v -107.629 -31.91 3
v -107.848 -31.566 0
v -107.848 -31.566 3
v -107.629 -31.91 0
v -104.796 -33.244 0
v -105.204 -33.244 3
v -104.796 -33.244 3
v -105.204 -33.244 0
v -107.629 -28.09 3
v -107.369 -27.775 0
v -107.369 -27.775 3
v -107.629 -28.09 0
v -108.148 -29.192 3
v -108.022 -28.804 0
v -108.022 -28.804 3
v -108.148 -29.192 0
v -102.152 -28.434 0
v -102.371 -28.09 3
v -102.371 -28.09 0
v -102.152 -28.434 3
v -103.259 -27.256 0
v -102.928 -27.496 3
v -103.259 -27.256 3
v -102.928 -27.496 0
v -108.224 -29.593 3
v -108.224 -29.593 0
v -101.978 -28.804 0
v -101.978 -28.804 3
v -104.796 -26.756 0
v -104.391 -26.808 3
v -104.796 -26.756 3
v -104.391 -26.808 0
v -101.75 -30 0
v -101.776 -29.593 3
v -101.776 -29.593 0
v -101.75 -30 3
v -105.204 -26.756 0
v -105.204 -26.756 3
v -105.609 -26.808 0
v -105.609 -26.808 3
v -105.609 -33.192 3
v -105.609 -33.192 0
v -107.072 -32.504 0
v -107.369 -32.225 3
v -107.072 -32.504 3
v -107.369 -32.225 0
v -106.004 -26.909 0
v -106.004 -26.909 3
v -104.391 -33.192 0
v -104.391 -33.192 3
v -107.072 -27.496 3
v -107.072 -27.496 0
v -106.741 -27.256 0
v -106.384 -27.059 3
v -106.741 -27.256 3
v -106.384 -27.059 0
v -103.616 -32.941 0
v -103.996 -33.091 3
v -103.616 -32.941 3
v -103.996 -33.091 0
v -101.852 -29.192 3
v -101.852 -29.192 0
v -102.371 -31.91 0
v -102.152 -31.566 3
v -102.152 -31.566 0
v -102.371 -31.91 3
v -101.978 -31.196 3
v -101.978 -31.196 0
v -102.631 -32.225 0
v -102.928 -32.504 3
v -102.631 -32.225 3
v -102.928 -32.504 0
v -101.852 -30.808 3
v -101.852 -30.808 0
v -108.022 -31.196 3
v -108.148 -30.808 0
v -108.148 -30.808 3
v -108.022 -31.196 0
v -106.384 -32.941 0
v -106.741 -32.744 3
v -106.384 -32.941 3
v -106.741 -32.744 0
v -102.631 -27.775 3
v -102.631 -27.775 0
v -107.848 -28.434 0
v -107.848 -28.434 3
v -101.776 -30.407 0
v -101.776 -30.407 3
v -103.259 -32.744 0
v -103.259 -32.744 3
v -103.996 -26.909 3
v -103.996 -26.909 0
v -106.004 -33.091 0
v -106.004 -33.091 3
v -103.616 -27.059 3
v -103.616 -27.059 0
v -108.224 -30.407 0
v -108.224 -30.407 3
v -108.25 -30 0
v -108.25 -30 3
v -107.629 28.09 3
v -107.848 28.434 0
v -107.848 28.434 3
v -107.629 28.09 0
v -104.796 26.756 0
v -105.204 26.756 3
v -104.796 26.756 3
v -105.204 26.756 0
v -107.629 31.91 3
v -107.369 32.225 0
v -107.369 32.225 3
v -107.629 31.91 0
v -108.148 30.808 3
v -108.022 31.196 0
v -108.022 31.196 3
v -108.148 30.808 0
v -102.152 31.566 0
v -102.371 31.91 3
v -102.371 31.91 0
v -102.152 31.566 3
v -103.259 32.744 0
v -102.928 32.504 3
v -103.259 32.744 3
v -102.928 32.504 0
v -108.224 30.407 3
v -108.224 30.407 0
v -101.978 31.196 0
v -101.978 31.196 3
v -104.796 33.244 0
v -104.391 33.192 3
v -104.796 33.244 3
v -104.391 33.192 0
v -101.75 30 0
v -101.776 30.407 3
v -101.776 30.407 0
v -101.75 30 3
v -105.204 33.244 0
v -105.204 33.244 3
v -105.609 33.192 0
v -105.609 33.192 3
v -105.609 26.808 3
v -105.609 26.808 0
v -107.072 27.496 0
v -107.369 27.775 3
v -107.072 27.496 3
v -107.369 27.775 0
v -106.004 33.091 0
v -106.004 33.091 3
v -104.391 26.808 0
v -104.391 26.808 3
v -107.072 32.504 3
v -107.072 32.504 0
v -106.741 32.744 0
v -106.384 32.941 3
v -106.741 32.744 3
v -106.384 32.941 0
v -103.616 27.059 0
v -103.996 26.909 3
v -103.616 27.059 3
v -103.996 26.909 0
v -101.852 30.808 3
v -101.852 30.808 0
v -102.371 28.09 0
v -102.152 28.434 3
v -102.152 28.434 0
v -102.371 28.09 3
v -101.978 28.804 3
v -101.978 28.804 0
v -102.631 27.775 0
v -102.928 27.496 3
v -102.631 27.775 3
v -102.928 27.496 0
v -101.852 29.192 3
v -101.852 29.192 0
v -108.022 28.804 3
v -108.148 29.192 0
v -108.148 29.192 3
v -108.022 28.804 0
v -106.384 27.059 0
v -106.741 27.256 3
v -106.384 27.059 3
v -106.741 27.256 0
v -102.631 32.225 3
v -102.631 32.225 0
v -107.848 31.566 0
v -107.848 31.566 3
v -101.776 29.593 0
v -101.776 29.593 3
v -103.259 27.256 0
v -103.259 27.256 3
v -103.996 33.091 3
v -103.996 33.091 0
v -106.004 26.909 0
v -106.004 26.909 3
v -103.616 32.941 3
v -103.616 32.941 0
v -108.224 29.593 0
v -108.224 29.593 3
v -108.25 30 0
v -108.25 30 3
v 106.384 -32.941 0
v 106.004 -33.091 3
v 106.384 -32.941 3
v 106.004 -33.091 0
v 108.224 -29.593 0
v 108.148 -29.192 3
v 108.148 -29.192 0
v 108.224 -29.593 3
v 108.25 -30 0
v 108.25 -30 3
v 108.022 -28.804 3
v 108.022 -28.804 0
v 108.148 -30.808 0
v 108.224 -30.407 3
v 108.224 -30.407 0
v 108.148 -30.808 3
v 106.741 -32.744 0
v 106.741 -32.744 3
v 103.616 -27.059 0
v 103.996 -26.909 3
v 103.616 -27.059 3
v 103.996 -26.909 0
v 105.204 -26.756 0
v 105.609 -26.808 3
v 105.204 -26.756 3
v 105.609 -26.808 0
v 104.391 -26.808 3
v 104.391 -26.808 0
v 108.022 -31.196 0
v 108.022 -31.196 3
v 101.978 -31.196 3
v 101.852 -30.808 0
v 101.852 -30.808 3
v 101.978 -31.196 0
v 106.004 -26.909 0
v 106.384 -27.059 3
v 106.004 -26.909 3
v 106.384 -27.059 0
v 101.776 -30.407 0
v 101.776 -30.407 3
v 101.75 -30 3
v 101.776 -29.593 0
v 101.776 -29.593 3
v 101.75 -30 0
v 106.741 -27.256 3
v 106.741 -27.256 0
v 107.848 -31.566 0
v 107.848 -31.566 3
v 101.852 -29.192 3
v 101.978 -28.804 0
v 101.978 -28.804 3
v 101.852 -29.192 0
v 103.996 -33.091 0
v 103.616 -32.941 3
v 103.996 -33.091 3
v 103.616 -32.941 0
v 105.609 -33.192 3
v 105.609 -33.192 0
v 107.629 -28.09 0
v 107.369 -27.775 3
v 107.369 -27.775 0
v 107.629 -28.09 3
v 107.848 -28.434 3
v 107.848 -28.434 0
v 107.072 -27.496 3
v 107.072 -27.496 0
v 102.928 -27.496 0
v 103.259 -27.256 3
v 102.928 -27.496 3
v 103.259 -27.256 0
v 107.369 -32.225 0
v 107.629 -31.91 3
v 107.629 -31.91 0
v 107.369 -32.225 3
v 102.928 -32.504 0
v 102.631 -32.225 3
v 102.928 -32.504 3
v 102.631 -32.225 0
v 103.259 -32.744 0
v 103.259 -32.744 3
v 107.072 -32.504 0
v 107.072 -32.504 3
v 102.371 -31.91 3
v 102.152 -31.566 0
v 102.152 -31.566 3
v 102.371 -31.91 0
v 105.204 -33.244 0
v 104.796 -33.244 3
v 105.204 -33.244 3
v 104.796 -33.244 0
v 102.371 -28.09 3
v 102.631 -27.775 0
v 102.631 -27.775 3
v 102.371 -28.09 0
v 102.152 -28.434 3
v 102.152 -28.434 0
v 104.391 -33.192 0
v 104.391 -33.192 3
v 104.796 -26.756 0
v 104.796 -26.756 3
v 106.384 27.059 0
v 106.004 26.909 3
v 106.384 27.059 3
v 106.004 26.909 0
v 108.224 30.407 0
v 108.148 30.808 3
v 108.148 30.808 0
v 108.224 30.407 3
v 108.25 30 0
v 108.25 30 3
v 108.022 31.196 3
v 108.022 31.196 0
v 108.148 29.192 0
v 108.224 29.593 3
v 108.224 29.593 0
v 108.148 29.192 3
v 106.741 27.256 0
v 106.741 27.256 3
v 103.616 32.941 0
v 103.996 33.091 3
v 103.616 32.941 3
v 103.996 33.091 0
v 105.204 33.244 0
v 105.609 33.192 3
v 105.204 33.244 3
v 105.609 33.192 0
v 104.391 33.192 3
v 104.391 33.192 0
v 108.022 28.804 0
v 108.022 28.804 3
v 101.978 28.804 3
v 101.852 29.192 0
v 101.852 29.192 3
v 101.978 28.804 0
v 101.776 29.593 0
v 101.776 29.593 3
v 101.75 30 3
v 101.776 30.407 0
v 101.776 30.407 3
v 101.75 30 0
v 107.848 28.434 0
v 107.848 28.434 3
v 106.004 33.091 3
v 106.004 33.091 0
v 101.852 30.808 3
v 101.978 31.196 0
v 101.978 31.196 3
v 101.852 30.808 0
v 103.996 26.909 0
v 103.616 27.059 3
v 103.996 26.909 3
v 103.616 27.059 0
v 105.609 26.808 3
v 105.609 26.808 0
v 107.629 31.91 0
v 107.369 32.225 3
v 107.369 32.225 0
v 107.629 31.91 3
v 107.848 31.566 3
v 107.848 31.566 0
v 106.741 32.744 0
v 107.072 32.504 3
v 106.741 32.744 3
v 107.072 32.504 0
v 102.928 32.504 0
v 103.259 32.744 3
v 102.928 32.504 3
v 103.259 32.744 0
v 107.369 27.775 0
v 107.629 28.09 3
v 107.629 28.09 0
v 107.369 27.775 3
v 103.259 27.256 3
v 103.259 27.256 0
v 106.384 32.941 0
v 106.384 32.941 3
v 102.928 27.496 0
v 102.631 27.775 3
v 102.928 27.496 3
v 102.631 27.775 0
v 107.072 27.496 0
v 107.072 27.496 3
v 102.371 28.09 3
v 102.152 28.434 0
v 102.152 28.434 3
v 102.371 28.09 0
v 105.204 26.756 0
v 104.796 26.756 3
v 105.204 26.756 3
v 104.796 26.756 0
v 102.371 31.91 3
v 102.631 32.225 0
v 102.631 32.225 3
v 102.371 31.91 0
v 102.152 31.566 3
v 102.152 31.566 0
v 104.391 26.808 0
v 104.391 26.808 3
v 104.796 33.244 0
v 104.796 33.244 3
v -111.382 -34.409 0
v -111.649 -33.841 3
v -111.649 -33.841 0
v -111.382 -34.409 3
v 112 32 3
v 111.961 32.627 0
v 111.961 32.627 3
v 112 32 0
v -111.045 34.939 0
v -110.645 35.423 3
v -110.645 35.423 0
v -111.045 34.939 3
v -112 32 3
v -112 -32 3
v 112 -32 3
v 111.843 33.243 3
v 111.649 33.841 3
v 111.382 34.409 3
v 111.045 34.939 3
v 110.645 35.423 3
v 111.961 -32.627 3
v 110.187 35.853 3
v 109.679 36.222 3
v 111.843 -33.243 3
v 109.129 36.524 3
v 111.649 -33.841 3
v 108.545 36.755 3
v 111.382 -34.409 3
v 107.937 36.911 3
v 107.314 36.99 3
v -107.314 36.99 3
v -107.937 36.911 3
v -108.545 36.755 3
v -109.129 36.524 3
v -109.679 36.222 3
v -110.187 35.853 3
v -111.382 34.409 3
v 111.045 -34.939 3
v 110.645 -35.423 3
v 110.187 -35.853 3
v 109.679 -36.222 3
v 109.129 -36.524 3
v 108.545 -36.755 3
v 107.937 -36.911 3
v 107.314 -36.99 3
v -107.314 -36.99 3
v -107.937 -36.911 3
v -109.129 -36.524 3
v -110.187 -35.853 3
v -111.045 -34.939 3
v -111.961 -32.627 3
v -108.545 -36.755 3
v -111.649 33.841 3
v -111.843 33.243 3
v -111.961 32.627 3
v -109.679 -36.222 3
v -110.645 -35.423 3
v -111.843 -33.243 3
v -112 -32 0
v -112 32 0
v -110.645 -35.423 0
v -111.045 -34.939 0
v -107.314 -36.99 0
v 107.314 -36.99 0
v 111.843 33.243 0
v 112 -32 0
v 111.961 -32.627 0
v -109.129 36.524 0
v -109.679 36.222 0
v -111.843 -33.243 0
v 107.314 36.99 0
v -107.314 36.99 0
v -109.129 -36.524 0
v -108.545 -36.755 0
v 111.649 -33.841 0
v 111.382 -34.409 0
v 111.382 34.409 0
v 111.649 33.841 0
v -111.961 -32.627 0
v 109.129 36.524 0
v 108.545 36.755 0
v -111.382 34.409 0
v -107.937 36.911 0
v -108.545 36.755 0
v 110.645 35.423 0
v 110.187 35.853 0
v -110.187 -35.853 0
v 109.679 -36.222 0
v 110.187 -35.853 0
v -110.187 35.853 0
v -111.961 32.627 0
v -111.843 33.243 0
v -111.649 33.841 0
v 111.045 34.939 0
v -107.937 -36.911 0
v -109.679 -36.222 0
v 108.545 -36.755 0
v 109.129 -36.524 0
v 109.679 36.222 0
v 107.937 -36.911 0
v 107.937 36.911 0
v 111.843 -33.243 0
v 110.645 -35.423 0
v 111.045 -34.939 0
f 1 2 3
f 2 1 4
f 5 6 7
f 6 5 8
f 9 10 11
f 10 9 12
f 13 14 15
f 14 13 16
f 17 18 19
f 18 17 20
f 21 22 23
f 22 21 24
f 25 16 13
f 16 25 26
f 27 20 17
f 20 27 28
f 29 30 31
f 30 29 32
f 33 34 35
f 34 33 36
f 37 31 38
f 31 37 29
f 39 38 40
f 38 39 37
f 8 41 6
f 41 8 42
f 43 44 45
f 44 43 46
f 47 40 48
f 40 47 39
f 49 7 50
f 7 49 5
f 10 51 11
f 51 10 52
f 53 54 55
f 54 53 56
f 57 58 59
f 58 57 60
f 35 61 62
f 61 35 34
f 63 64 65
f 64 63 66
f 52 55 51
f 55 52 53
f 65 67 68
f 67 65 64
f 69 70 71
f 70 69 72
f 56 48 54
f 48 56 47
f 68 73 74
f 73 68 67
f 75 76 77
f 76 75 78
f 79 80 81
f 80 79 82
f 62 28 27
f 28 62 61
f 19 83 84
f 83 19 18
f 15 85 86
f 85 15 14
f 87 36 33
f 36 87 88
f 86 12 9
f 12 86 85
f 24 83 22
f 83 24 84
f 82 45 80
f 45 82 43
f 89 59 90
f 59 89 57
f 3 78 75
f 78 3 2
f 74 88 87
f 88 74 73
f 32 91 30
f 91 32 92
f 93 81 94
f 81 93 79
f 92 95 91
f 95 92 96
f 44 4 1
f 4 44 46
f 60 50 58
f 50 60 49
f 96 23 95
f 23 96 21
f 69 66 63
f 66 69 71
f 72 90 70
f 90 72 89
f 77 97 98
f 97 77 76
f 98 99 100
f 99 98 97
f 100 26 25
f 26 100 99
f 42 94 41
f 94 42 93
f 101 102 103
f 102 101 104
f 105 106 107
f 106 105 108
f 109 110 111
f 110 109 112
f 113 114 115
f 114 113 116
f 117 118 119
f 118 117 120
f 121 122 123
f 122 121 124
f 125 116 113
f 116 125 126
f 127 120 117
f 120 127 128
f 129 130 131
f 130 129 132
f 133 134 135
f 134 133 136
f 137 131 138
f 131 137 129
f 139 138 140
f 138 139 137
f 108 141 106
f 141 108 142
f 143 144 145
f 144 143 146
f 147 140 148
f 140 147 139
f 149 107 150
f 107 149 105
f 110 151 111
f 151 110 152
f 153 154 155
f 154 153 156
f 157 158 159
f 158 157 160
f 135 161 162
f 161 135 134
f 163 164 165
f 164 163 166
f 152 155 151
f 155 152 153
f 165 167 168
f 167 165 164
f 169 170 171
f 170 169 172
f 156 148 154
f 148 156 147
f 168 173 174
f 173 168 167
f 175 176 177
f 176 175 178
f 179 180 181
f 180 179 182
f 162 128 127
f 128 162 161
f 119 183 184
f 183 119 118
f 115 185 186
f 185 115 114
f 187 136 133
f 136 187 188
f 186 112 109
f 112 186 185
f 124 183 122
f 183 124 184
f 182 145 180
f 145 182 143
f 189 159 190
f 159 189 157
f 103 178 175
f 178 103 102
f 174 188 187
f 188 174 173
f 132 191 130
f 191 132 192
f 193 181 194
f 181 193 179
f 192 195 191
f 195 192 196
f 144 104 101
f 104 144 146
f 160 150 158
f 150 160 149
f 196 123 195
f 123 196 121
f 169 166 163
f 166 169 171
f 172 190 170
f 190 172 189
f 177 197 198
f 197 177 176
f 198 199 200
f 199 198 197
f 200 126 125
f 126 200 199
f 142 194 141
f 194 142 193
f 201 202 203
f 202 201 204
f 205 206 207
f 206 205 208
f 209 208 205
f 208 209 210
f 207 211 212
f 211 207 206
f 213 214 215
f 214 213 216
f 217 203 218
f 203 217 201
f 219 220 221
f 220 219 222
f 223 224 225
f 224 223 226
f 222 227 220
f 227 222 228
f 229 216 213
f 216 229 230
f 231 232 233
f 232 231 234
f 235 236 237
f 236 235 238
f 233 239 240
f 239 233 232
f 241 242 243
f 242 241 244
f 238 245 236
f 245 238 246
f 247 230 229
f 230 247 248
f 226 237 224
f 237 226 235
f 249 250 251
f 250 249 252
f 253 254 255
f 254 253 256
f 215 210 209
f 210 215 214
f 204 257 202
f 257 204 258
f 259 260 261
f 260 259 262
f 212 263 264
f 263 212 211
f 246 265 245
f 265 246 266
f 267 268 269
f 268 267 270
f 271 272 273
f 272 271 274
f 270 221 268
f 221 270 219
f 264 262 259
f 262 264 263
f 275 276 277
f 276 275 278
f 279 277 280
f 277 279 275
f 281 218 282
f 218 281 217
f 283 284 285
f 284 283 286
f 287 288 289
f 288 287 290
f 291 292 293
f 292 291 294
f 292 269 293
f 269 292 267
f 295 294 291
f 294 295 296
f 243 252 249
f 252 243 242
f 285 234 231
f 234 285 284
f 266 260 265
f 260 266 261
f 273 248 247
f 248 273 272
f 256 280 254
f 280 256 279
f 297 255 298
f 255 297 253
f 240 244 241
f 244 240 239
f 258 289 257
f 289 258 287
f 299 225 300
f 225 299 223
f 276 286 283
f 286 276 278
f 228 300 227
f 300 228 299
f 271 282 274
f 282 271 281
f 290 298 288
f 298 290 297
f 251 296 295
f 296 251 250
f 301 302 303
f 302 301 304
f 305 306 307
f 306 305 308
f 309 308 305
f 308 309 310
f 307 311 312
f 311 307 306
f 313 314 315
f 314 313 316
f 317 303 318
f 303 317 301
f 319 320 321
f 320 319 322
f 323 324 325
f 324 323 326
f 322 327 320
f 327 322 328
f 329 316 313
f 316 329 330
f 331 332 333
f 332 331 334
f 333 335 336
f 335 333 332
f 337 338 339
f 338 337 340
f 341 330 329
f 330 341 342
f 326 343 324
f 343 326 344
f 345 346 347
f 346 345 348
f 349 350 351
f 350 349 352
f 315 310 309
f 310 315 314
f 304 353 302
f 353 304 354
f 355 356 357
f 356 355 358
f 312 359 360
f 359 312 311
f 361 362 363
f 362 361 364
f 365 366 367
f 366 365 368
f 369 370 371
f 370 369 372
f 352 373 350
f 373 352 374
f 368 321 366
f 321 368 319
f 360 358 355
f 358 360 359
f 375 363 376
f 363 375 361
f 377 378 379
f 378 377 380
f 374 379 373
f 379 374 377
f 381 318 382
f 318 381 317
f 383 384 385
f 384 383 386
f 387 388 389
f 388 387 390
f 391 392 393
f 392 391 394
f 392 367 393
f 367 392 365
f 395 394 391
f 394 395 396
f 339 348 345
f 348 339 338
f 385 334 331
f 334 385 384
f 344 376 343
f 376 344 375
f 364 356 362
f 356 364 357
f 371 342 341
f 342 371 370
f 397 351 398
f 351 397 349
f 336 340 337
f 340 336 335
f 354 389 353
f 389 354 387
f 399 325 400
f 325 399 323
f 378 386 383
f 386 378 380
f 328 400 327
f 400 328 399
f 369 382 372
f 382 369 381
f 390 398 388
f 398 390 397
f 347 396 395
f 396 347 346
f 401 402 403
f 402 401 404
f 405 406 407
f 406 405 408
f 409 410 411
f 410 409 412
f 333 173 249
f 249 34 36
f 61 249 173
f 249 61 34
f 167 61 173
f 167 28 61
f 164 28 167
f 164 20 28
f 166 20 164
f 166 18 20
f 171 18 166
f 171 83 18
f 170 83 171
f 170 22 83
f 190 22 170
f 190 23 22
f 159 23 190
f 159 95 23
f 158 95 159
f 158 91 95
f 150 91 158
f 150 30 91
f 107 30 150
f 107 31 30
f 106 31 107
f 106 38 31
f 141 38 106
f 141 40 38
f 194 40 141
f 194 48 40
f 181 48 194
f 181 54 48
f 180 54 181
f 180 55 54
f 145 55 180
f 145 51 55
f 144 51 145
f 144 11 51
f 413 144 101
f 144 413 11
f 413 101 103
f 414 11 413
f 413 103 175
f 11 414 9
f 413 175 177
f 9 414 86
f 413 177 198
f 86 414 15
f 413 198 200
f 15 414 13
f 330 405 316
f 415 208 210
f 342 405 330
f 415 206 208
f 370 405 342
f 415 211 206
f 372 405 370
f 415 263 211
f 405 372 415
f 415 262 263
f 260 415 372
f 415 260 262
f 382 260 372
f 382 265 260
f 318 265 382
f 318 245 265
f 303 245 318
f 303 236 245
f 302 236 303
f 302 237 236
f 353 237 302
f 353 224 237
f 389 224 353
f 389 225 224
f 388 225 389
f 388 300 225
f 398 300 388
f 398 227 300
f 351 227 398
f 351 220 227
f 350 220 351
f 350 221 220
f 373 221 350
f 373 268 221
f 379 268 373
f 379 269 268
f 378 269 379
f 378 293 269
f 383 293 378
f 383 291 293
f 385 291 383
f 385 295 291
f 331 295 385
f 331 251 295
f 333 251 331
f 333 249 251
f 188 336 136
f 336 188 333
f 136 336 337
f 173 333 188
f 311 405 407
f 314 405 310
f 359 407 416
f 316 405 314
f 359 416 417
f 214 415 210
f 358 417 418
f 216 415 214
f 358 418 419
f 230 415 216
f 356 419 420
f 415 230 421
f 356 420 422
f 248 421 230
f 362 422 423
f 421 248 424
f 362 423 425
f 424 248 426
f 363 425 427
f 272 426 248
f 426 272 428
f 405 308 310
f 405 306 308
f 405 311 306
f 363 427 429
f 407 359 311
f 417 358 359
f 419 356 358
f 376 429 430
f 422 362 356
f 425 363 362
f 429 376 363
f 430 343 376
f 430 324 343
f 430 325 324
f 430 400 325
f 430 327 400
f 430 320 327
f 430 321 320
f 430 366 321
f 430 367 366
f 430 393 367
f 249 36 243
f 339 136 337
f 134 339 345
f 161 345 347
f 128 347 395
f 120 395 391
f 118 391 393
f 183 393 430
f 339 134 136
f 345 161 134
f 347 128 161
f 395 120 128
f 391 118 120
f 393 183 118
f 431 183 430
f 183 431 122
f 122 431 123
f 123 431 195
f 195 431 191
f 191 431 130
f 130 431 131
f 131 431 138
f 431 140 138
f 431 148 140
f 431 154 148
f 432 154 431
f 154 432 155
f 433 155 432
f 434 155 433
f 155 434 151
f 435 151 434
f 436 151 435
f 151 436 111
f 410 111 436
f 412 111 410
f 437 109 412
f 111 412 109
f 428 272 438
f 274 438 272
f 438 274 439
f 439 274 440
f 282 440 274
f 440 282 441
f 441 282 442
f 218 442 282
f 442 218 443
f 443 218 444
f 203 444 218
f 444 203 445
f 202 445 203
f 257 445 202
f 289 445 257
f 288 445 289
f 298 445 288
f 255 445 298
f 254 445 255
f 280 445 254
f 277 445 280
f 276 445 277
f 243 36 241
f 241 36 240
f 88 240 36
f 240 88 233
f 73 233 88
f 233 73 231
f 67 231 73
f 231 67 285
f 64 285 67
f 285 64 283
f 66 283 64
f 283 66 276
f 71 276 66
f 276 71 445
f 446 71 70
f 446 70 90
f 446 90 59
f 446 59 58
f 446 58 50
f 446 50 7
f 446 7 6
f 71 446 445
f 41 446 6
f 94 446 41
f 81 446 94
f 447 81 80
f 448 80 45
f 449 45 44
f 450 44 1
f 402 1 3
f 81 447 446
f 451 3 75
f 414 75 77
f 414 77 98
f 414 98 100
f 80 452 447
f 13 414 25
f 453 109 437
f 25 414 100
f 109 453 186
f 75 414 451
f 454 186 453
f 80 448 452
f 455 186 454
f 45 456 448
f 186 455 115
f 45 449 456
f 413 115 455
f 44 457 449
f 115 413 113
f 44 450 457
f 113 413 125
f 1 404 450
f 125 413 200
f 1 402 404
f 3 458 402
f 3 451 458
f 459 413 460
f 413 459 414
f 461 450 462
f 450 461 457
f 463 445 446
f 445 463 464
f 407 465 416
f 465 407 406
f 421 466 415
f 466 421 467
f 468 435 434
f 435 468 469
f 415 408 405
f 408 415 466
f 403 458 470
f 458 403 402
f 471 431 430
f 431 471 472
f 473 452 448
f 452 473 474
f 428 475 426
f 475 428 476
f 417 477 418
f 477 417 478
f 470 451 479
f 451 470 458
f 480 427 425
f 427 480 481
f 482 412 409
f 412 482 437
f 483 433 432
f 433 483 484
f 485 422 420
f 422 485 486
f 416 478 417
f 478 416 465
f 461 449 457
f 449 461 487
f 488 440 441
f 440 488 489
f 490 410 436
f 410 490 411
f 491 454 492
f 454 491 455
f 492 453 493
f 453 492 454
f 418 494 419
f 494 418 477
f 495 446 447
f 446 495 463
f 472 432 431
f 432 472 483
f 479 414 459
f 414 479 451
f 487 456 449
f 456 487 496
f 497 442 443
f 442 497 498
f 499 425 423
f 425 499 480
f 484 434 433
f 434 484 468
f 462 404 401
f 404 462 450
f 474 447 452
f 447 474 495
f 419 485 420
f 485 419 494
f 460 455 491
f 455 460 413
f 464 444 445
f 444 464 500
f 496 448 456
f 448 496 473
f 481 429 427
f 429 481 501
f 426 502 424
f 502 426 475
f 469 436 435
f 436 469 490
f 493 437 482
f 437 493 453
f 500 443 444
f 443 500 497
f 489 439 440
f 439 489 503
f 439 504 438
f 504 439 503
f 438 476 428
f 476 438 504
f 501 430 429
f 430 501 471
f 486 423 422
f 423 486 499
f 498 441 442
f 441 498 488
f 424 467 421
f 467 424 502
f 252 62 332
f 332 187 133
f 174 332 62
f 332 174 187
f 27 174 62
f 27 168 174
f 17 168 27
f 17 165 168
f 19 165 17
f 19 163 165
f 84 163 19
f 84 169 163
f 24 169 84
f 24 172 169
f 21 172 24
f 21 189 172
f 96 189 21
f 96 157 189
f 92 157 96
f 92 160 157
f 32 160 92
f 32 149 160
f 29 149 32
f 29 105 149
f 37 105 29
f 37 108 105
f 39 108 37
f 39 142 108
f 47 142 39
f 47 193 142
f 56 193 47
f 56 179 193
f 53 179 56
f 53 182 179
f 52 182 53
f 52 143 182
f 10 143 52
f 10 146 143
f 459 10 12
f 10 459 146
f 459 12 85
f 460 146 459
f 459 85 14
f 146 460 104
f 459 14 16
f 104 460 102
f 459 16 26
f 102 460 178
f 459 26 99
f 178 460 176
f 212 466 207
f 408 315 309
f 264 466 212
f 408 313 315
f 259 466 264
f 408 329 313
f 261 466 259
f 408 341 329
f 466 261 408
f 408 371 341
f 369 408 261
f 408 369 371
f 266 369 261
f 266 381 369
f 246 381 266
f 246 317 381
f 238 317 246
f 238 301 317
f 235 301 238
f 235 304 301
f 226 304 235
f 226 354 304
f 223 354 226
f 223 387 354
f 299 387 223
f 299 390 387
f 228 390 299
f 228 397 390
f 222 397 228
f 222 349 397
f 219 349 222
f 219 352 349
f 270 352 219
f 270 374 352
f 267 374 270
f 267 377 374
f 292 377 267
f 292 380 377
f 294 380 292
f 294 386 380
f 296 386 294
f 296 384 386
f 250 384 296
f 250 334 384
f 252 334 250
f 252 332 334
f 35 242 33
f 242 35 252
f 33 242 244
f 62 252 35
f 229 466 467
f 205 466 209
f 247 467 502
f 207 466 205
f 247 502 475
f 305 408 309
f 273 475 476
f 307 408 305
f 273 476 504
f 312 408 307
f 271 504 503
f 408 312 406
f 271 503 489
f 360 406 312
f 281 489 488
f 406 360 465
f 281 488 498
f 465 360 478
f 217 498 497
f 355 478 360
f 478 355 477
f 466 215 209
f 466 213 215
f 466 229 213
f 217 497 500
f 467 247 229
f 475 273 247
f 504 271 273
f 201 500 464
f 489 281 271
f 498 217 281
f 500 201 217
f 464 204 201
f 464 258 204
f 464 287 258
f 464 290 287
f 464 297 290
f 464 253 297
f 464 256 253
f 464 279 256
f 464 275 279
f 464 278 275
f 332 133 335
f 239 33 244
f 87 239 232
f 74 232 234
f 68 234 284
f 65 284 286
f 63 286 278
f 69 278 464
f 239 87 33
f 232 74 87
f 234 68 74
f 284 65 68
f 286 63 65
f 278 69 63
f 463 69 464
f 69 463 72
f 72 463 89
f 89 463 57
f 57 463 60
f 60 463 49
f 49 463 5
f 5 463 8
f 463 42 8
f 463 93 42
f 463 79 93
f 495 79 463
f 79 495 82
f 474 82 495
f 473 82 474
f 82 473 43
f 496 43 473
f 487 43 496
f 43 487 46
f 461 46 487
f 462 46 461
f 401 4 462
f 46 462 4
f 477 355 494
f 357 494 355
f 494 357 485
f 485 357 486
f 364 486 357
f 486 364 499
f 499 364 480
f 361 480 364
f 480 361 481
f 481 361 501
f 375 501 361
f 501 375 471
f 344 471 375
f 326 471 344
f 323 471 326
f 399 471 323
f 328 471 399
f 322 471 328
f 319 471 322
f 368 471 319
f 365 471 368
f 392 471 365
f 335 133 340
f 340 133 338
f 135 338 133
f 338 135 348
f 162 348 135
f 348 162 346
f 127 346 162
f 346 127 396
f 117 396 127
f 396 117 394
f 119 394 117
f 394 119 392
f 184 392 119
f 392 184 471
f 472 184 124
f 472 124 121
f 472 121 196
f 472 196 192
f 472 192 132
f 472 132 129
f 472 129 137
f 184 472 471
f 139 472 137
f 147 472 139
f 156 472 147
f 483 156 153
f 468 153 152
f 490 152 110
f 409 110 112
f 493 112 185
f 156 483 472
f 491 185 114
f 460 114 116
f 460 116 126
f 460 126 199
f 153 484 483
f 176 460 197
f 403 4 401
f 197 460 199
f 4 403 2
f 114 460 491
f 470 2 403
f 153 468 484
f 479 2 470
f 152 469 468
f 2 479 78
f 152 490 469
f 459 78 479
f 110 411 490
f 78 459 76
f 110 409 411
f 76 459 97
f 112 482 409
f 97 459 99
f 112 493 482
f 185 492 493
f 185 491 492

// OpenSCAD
$fn = 50;


difference() {
	union() {
		hull() {
			translate(v = [-107.0000000000, 32.0000000000, 0]) {
				cylinder(h = 3, r = 5);
			}
			translate(v = [107.0000000000, 32.0000000000, 0]) {
				cylinder(h = 3, r = 5);
			}
			translate(v = [-107.0000000000, -32.0000000000, 0]) {
				cylinder(h = 3, r = 5);
			}
			translate(v = [107.0000000000, -32.0000000000, 0]) {
				cylinder(h = 3, r = 5);
			}
		}
	}
	union() {
		translate(v = [-105.0000000000, -30.0000000000, -100.0000000000]) {
			cylinder(h = 200, r = 3.2500000000);
		}
		translate(v = [-105.0000000000, 30.0000000000, -100.0000000000]) {
			cylinder(h = 200, r = 3.2500000000);
		}
		translate(v = [105.0000000000, -30.0000000000, -100.0000000000]) {
			cylinder(h = 200, r = 3.2500000000);
		}
		translate(v = [105.0000000000, 30.0000000000, -100.0000000000]) {
			cylinder(h = 200, r = 3.2500000000);
		}
	}
}
